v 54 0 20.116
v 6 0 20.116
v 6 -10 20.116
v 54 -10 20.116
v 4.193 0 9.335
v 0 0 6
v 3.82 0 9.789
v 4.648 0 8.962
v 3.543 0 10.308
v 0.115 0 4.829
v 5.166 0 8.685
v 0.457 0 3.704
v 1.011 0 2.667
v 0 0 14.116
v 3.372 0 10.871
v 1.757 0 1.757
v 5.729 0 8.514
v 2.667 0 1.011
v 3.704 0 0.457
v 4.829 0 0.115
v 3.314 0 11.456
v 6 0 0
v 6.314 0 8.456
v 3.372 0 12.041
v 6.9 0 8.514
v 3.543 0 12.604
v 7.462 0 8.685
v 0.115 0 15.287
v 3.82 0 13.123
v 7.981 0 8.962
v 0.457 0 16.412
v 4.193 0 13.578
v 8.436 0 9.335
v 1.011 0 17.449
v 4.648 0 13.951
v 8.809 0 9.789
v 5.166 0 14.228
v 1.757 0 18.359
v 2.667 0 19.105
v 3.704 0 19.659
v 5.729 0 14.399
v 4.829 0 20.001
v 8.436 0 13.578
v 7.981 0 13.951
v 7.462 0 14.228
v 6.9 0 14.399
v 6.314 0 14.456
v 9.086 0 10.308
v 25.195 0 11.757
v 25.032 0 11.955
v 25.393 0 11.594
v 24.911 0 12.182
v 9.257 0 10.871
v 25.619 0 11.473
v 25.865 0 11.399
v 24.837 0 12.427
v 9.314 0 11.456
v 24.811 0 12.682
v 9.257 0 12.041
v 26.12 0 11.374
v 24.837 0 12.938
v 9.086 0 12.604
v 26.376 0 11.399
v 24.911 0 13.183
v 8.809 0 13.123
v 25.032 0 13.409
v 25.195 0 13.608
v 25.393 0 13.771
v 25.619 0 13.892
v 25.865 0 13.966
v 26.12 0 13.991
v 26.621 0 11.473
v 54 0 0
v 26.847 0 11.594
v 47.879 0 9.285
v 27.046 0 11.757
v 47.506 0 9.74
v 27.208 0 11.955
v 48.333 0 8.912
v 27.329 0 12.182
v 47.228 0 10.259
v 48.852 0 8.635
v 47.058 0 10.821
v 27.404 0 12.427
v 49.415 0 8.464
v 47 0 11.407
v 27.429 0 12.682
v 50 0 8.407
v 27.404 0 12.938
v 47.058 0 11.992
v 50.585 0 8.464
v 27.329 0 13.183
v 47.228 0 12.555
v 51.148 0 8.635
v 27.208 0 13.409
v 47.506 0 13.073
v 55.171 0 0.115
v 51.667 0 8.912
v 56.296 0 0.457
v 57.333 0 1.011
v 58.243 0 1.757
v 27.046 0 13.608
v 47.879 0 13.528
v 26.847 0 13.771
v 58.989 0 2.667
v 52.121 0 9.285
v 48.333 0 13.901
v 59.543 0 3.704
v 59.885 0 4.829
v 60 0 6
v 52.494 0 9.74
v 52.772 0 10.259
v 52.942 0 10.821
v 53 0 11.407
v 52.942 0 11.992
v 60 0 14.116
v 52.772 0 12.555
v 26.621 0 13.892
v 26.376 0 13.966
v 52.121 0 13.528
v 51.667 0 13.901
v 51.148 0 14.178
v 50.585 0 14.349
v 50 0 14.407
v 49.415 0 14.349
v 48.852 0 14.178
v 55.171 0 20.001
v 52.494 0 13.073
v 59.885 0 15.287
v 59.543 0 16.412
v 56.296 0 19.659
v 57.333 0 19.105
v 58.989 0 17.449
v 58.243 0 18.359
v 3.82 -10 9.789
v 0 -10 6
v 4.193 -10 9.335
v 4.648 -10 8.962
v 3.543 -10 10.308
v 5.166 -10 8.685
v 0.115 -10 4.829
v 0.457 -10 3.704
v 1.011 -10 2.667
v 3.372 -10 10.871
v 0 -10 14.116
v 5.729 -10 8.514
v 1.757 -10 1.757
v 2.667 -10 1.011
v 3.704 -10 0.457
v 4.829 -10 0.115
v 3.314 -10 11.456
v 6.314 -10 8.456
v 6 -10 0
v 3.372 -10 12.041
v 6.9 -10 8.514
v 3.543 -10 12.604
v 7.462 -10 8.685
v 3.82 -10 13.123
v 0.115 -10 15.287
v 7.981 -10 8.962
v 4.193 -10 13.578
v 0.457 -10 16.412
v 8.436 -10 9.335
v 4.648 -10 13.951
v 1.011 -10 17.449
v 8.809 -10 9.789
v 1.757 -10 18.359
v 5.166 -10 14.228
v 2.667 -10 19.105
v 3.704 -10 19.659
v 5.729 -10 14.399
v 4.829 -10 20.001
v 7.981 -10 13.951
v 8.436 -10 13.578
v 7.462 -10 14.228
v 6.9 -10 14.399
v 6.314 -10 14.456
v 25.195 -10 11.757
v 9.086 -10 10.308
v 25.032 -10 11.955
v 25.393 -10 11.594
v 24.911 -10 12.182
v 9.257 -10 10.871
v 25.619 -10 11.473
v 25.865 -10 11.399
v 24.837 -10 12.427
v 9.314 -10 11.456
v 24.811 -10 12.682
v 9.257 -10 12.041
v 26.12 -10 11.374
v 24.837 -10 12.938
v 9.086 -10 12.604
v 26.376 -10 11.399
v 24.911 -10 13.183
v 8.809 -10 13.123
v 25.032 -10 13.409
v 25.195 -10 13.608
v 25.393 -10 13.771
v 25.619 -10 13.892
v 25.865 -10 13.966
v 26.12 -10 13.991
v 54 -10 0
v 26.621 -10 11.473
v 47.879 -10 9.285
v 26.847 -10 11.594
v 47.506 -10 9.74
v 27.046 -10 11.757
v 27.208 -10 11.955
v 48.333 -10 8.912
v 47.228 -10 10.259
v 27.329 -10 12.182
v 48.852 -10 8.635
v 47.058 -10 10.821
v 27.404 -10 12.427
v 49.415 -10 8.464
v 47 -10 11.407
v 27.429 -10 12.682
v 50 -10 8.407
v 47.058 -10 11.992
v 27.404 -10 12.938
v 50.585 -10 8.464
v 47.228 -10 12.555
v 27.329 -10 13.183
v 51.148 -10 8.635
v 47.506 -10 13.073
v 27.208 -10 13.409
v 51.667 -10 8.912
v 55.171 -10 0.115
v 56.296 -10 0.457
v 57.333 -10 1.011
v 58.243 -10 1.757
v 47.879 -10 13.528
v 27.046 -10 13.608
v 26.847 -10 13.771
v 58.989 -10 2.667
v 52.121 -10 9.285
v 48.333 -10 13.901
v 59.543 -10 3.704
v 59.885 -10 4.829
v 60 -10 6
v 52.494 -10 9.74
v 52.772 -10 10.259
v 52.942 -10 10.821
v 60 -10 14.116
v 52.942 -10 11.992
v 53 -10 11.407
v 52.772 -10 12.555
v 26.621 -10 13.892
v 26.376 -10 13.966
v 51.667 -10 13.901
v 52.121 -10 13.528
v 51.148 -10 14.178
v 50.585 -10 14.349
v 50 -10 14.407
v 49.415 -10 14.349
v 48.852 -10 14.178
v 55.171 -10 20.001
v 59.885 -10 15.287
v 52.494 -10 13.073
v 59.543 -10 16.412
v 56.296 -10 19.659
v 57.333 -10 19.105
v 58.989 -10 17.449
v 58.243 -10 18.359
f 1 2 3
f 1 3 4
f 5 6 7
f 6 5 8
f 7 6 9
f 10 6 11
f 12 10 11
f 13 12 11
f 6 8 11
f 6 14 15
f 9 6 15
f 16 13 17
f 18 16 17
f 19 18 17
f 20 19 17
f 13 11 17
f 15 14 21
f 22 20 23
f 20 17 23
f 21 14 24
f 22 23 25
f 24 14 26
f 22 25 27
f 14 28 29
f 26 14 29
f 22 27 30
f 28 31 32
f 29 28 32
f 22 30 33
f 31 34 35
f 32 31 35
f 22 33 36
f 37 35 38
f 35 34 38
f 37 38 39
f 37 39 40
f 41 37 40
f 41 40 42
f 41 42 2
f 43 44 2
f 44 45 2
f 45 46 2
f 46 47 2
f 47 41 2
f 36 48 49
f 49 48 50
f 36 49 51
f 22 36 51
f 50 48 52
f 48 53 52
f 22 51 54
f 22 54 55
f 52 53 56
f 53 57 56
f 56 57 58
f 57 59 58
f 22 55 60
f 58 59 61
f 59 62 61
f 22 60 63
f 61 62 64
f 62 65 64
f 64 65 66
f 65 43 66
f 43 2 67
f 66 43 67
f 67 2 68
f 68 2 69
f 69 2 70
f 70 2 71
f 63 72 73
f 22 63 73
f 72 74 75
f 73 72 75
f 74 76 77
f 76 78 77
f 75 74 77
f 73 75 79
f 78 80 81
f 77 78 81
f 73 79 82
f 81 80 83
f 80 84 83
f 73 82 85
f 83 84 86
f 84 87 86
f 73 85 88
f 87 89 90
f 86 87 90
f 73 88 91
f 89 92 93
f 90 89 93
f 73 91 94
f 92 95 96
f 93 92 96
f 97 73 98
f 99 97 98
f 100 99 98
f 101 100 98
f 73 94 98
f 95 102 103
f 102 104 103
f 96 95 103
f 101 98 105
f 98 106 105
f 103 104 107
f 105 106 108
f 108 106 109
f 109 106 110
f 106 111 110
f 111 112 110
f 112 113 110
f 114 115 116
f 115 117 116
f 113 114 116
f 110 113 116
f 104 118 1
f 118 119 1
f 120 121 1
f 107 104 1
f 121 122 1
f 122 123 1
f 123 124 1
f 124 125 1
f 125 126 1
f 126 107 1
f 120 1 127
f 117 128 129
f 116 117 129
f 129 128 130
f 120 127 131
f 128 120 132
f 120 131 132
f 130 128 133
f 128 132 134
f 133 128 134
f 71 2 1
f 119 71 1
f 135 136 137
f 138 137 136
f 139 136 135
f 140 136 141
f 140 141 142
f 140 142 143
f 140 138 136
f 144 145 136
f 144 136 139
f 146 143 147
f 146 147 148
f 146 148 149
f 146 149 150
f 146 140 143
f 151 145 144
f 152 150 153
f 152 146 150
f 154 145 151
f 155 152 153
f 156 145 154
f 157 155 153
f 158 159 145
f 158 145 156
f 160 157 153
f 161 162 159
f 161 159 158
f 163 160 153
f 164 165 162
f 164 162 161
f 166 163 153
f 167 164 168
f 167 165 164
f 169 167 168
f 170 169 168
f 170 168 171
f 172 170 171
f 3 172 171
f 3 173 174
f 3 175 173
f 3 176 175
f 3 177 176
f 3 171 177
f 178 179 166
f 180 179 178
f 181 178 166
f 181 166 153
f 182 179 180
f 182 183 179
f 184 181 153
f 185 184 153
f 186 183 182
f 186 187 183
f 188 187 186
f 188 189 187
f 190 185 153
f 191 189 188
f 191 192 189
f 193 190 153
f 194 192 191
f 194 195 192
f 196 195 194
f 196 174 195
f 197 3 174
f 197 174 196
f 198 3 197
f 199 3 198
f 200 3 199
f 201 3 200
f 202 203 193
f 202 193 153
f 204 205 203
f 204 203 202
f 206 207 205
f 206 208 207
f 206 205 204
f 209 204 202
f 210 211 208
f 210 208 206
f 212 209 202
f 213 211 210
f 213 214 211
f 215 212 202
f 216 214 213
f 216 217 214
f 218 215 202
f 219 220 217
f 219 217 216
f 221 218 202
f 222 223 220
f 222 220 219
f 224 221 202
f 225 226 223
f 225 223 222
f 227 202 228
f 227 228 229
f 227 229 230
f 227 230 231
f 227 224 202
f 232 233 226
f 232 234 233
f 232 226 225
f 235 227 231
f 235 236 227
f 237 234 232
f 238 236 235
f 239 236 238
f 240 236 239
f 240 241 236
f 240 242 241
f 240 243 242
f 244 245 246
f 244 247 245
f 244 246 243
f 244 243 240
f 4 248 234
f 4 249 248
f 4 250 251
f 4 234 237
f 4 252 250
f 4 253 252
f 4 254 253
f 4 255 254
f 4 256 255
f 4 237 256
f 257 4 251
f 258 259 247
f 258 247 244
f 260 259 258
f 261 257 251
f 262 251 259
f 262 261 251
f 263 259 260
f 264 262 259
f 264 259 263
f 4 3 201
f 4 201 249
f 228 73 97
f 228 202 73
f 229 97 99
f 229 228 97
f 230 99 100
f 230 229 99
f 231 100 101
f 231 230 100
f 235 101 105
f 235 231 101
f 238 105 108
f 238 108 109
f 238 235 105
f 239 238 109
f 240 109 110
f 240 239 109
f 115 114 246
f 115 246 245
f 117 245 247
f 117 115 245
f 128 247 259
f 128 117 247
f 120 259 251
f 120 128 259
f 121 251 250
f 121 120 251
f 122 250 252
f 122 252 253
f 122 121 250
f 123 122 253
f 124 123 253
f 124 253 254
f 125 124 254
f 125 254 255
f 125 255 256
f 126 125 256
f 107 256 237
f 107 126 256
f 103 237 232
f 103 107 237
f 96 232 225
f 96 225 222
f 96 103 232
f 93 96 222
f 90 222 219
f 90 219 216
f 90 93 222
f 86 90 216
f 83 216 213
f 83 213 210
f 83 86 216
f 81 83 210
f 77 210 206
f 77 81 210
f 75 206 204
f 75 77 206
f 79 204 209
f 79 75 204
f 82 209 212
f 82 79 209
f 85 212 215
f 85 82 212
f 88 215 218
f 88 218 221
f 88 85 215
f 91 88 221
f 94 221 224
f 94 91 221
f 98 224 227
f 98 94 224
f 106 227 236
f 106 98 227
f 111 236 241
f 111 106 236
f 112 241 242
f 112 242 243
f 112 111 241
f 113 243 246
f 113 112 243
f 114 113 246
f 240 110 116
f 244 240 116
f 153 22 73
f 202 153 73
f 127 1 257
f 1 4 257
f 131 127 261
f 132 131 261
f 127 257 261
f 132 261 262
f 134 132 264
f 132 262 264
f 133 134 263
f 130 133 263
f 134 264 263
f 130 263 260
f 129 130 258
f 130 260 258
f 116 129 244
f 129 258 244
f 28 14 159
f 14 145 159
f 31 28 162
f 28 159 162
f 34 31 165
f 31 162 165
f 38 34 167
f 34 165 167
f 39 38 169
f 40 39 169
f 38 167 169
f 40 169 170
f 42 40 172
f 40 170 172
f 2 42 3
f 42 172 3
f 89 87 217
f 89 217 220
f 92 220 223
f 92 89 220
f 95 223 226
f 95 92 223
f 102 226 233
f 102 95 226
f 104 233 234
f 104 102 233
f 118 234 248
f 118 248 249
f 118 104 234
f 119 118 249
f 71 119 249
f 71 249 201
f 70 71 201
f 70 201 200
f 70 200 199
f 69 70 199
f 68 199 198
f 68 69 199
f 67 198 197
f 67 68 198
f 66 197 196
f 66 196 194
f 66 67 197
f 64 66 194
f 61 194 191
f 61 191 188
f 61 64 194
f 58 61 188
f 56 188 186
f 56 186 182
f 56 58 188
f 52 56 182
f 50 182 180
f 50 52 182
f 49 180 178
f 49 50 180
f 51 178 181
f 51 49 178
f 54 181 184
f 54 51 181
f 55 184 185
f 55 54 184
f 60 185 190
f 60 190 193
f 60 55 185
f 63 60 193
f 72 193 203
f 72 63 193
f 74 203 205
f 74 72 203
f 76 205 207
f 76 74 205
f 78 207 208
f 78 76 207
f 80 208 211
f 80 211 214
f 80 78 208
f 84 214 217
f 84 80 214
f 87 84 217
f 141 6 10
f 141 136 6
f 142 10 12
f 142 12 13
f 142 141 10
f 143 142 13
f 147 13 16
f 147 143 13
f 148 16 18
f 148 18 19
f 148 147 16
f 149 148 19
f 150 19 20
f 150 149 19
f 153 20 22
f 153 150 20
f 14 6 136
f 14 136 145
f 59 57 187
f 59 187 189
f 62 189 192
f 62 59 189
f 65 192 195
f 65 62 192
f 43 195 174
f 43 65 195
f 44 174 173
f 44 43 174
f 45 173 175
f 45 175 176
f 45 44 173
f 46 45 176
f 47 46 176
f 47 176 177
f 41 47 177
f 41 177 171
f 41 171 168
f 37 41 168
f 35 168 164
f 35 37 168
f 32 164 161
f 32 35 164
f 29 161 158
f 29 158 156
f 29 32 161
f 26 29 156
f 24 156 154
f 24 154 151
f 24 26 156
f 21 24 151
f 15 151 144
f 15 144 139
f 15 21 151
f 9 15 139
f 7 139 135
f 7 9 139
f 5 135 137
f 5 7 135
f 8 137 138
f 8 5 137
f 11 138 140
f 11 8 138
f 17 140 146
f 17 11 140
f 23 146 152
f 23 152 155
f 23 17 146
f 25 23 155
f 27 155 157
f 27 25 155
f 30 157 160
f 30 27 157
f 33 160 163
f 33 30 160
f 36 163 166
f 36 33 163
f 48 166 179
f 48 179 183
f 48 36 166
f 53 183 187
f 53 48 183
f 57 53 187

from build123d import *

# Parameters (mm, degrees)
F0_W     = 60
F0_H     = 20.115981
F0_R     = 3
F0_R_2   = 1.308767
F1_DEPTH = 10
F3_R     = 6


with BuildPart() as f1:
    # F0 (on Front) → F1 (new body)
    with BuildSketch(Plane.XZ):
        with Locations((30, 10.05799)):
            Rectangle(F0_W, F0_H)
        with Locations((6.314433, 11.456186)):
            Circle(F0_R, mode=Mode.SUBTRACT)
        with Locations((26.120204, 12.682377)):
            Circle(F0_R_2, mode=Mode.SUBTRACT)
        with Locations((50, 11.406668)):
            Circle(F0_R, mode=Mode.SUBTRACT)
    extrude(amount=F1_DEPTH)

    # F3
    f3_edges = [f1.edges().sort_by_distance(p)[0] for p in [
        (0, -5, 0),
        (0, -5, 20.115981),
        (60, -5, 0),
        (60, -5, 20.115981),
    ]]
    fillet(f3_edges, radius=F3_R)


solid = f1.part
